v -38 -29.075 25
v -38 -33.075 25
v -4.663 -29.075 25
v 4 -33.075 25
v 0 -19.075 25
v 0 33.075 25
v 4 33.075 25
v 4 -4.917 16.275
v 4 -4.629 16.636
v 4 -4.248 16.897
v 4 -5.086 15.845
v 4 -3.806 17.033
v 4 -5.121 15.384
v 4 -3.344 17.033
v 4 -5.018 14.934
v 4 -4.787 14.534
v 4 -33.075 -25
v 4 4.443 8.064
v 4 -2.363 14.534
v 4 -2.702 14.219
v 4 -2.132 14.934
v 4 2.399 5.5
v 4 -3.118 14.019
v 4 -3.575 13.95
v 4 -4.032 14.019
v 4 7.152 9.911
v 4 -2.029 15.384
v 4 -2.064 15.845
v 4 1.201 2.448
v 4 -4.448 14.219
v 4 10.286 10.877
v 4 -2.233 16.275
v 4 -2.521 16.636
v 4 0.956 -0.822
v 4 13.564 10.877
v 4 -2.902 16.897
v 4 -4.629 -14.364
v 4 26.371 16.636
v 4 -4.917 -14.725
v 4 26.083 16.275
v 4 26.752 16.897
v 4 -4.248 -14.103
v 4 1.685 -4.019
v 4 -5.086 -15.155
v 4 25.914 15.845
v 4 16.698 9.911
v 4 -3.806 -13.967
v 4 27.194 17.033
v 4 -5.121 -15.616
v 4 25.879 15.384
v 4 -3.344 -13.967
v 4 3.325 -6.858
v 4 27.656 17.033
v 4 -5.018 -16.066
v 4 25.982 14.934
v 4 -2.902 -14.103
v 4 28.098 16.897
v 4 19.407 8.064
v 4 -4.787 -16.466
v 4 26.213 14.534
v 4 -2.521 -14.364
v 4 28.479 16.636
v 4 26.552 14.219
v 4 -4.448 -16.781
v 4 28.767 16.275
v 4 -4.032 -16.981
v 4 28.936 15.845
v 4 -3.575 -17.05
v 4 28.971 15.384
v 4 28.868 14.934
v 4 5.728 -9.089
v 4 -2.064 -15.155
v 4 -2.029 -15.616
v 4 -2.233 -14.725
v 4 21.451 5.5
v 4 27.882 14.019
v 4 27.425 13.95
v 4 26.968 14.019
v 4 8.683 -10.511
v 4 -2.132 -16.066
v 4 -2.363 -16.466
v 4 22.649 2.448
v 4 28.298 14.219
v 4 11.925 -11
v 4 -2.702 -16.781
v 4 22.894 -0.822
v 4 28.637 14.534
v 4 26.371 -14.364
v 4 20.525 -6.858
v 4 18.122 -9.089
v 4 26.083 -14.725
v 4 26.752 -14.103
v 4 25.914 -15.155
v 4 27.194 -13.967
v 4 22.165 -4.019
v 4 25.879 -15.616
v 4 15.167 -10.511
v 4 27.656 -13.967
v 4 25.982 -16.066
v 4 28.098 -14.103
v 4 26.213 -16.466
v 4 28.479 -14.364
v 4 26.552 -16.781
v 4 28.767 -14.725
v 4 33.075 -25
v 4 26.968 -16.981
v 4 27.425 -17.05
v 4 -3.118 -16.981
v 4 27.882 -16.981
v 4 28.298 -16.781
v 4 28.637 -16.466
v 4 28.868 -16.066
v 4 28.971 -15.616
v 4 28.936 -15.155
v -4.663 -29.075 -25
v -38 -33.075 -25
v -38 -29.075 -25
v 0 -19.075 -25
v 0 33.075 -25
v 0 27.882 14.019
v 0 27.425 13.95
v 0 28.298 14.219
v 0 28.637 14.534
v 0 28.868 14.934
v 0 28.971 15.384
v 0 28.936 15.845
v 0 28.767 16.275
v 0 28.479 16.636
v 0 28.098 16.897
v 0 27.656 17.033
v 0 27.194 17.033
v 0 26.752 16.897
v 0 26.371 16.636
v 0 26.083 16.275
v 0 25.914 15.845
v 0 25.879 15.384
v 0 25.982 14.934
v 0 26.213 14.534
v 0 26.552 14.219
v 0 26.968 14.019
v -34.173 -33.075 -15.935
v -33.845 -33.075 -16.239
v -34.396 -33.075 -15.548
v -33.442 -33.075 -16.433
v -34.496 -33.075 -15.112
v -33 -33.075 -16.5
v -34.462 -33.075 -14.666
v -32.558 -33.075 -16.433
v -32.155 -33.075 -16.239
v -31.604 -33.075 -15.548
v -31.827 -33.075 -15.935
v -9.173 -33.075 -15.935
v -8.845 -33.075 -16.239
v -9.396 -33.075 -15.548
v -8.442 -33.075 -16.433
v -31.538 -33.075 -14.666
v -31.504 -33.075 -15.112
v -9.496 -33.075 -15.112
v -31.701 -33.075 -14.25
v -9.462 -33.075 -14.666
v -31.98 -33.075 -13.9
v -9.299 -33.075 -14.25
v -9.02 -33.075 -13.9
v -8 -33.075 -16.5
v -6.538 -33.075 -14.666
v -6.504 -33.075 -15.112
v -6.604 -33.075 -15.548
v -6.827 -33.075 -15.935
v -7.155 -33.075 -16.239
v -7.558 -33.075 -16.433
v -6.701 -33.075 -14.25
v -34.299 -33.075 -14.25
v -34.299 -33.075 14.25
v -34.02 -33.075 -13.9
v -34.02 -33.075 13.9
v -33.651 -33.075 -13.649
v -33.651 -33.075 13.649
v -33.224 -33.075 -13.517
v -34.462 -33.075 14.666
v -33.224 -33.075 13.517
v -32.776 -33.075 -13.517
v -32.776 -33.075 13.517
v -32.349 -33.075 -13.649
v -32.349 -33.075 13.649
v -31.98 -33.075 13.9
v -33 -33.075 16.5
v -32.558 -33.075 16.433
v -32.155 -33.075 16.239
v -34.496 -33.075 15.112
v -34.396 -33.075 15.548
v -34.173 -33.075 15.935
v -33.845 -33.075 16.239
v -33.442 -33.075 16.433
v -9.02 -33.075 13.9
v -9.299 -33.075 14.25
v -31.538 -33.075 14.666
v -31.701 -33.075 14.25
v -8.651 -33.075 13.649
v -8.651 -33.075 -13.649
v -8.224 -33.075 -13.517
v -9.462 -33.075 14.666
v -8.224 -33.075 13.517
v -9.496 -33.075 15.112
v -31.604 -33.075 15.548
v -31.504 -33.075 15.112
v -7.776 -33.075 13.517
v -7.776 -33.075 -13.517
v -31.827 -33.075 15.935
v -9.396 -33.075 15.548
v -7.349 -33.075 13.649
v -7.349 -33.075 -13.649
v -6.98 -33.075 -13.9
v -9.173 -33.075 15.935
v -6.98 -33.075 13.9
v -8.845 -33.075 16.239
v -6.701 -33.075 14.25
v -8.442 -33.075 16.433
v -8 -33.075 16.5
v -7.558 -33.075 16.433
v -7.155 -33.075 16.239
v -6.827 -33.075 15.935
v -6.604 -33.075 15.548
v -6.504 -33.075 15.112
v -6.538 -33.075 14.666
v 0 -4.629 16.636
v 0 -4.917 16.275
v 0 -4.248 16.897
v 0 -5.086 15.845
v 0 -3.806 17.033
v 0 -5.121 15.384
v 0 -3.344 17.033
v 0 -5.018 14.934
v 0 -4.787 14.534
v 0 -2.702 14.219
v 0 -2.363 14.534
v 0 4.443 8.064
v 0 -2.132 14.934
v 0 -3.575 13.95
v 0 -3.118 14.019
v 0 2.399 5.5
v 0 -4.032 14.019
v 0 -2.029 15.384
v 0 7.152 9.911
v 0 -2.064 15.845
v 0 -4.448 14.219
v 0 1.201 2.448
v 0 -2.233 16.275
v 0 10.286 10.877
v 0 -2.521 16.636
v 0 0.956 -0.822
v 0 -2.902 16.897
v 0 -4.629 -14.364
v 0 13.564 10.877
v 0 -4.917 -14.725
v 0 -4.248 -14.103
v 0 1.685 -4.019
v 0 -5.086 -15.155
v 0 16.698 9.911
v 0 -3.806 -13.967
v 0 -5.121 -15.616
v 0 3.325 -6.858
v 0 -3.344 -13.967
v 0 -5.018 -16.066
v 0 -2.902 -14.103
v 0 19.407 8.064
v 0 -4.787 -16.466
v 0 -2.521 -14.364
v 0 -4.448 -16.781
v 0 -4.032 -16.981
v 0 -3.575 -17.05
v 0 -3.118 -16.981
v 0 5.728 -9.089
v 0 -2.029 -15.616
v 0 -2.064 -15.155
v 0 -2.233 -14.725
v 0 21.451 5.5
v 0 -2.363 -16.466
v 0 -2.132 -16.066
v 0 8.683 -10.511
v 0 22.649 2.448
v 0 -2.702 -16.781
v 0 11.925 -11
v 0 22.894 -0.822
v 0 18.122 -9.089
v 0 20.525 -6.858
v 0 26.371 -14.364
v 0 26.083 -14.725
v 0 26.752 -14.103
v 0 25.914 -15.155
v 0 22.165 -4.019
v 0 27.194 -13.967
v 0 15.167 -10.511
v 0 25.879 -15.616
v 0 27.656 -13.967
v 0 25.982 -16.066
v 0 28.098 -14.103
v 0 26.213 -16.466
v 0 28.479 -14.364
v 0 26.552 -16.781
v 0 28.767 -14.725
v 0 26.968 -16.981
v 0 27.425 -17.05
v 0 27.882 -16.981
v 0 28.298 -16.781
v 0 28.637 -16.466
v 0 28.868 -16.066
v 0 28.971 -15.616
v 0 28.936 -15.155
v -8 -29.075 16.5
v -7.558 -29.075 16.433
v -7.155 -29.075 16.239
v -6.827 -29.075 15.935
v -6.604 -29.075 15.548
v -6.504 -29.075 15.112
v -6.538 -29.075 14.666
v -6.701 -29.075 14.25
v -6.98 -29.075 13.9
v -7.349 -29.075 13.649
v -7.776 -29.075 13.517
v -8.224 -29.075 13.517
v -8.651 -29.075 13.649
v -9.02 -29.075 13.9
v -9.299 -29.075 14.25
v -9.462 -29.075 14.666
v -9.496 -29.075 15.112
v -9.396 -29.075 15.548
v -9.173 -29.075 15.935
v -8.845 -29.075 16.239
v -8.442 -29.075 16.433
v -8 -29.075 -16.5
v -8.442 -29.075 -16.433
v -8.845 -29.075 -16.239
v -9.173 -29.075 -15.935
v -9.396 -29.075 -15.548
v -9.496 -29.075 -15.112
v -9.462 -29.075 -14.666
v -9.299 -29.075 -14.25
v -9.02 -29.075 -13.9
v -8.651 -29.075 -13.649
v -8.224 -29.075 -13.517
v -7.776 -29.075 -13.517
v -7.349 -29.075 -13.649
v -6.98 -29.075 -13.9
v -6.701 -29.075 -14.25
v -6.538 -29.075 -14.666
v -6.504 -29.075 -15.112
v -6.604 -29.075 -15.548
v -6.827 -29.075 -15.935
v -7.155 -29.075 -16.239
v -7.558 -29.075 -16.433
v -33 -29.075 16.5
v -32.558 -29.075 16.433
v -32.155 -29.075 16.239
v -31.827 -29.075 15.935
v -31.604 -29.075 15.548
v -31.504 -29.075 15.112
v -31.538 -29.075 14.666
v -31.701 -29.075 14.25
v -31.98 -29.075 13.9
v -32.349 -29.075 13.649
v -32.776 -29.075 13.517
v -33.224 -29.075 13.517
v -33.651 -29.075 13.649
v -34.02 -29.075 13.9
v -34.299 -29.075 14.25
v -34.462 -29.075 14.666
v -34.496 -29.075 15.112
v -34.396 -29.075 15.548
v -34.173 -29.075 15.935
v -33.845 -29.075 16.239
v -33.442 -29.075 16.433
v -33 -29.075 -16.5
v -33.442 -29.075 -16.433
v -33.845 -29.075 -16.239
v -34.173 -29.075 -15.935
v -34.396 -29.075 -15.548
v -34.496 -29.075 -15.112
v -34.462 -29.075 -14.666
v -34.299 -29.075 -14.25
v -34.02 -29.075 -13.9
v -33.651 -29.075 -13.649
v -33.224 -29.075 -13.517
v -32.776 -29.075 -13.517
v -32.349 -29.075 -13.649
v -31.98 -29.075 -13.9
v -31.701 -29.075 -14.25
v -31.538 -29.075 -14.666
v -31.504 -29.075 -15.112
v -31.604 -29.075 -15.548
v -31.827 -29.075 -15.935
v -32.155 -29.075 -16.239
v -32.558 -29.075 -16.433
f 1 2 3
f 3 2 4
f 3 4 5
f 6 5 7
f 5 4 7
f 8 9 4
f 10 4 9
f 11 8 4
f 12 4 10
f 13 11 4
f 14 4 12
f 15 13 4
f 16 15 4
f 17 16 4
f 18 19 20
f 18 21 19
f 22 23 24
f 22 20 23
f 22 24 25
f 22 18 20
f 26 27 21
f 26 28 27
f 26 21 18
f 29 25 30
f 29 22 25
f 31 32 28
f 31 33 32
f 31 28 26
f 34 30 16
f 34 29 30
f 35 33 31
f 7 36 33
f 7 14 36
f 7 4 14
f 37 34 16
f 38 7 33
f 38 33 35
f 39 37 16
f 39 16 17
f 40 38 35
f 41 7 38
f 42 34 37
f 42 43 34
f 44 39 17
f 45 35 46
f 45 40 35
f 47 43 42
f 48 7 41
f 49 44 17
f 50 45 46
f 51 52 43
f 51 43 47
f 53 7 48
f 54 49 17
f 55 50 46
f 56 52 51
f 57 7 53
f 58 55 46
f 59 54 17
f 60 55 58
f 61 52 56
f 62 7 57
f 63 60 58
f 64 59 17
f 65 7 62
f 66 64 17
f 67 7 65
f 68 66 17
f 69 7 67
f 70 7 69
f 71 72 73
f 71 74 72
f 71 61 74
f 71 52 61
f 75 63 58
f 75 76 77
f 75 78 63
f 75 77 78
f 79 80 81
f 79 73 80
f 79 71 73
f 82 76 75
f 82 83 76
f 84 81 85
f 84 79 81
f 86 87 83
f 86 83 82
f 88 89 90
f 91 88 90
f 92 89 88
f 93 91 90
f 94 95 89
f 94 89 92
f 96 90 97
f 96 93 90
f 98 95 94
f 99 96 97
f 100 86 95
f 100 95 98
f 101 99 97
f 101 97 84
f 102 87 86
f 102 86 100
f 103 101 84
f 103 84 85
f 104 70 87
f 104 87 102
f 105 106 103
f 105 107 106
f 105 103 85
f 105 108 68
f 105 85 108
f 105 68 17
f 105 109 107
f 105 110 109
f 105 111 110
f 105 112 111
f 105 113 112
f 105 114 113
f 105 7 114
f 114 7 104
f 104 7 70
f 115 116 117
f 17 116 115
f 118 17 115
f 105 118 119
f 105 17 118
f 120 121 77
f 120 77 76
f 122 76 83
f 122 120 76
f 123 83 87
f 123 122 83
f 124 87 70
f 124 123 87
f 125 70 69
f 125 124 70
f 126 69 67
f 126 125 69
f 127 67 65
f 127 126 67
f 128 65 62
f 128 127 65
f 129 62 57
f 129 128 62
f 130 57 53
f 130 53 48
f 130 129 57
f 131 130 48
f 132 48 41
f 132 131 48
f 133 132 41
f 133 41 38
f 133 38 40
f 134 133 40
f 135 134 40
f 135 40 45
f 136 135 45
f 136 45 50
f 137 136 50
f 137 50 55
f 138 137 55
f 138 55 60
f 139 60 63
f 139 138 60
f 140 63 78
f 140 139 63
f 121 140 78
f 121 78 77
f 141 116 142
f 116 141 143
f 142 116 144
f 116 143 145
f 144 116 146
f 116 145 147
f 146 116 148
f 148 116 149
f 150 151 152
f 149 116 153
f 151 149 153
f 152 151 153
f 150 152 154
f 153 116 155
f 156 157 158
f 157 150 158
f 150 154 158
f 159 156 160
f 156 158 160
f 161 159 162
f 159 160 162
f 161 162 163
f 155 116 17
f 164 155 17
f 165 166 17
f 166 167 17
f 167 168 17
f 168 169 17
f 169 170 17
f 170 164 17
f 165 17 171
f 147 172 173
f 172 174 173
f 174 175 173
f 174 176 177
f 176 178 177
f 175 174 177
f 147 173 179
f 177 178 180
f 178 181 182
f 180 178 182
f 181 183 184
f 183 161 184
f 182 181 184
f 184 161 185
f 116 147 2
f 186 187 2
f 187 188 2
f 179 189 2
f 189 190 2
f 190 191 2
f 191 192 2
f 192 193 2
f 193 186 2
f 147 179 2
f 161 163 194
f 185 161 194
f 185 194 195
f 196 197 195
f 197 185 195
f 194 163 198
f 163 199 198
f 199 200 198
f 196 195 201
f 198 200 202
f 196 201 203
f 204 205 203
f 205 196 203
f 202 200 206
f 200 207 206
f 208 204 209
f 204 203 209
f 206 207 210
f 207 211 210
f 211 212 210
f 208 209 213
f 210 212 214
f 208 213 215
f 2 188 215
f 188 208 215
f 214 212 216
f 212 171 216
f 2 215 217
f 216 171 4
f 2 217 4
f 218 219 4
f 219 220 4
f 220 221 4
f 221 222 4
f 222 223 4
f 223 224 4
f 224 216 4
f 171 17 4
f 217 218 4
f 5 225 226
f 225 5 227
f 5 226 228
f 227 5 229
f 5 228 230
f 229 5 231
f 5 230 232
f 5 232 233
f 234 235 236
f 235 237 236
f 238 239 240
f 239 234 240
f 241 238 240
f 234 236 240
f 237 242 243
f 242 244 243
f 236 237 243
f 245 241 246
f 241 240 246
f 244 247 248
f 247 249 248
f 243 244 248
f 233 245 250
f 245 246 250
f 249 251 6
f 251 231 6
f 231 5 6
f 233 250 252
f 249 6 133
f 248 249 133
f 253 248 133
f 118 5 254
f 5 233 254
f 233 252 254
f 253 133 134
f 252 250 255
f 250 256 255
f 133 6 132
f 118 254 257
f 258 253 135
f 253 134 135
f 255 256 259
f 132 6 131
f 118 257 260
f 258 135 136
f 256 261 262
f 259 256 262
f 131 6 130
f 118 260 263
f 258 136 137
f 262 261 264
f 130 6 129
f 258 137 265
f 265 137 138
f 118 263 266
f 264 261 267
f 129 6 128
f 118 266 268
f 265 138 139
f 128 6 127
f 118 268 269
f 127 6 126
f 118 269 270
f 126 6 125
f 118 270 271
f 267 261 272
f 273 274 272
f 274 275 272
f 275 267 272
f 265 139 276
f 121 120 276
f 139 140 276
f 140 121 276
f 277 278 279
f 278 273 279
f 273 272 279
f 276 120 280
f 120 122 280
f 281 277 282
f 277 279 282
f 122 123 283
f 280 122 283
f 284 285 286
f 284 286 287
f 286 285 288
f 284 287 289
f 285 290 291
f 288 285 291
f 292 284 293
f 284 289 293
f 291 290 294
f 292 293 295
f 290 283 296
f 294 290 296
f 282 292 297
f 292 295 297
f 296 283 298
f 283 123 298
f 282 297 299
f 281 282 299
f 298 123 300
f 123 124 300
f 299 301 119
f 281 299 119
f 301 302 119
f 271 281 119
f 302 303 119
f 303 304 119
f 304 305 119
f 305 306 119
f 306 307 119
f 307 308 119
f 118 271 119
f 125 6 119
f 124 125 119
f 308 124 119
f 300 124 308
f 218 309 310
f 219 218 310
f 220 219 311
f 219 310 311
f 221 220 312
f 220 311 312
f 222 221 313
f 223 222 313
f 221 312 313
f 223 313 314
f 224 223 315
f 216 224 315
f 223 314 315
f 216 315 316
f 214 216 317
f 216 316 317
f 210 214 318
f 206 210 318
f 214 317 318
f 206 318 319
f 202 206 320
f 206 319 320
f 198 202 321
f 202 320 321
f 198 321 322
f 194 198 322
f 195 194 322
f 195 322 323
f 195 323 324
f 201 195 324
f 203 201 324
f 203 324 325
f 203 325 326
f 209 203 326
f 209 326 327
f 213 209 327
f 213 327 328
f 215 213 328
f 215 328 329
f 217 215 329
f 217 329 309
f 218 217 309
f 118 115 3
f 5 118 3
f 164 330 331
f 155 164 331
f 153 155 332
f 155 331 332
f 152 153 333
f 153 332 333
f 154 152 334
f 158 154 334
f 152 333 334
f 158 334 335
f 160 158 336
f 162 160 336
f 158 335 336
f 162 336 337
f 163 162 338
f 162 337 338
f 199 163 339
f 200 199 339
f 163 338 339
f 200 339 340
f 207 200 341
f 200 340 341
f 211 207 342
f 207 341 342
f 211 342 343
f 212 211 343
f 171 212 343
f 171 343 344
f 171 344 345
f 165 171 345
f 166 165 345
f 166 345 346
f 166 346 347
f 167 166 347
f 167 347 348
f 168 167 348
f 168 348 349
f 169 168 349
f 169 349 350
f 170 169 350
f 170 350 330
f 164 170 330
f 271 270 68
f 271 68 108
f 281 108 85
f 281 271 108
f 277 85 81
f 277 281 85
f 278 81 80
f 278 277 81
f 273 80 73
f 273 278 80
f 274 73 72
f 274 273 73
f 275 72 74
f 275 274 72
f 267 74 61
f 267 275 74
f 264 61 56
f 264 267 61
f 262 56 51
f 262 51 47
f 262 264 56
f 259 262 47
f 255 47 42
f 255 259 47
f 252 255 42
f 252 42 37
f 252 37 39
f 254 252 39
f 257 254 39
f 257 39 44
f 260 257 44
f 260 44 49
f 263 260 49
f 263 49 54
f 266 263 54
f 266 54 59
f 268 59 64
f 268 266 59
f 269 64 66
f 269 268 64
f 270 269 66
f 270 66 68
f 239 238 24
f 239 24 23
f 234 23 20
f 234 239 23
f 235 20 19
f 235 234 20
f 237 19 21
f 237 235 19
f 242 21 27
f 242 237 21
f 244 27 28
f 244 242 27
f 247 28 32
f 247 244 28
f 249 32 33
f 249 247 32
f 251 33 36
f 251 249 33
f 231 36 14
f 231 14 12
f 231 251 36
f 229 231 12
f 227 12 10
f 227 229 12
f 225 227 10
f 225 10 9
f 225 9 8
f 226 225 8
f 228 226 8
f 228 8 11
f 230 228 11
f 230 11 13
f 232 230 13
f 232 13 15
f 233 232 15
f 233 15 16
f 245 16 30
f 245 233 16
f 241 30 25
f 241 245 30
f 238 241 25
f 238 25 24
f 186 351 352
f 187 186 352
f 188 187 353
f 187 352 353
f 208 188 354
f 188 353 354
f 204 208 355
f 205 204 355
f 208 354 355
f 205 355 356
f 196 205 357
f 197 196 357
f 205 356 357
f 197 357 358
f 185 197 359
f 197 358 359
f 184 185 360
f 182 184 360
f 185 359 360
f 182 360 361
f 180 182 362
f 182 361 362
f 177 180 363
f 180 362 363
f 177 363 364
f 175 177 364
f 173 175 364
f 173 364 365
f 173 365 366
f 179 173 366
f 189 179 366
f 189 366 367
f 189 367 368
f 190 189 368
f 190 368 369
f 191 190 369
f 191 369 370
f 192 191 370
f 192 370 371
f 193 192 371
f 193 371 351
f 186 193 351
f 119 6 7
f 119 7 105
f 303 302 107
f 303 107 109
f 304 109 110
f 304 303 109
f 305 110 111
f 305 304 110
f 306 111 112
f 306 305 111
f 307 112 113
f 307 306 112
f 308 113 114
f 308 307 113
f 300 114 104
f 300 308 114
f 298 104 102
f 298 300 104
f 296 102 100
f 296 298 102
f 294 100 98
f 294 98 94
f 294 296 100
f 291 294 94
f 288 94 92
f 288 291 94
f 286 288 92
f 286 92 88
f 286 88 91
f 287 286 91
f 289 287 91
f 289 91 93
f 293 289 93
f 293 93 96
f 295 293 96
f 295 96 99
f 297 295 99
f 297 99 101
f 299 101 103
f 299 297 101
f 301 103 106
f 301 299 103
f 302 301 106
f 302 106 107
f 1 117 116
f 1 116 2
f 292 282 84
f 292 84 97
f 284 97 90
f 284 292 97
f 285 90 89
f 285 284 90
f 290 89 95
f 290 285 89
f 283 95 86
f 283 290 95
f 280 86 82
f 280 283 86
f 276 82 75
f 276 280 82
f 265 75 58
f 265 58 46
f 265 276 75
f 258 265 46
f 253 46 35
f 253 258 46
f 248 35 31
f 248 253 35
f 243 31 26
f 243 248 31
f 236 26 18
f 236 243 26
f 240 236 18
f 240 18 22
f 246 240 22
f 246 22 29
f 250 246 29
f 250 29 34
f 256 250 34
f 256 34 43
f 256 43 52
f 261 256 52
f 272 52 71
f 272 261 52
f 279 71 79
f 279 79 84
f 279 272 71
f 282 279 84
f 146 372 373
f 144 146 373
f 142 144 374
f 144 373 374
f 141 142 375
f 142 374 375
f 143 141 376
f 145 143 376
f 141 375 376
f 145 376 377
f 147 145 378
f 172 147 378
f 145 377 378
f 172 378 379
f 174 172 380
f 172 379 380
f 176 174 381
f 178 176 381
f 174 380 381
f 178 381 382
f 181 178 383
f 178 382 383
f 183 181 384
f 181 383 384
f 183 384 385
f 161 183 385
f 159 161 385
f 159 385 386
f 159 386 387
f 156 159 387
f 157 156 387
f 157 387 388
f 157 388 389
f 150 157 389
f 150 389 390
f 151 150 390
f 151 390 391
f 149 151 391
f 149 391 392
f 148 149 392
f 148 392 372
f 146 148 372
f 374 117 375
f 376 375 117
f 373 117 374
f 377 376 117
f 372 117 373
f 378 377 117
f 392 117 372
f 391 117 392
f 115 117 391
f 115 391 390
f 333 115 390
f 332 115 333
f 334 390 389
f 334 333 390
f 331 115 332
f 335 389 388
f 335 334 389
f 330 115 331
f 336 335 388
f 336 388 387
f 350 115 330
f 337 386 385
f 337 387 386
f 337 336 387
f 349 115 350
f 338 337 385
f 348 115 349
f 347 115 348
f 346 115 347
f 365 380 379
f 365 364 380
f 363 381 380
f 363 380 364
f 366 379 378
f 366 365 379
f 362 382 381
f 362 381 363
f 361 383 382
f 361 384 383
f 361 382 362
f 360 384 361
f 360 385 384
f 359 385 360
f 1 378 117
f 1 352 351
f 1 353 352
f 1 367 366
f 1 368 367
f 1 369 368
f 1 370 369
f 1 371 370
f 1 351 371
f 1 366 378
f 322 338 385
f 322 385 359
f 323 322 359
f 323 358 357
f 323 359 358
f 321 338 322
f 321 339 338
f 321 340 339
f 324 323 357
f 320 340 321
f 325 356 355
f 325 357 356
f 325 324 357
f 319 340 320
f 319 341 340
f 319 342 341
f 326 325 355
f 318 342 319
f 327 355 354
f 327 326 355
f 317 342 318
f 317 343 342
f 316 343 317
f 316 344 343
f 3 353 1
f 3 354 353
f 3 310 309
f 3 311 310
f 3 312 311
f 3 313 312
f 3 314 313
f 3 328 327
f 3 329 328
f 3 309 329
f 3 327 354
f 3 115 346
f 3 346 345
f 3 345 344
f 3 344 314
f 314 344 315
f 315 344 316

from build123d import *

# Parameters (mm, degrees)
SKETCH1_W           = 50
SKETCH1_H           = 66.15
SKETCH1_R           = 11
SKETCH1_R_2         = 1.55
BOSS_EXTRUDE1_DEPTH = 4
SKETCH2_W           = 50
SKETCH2_H           = 4
BOSS_EXTRUDE2_DEPTH = 38
SKETCH3_R           = 1.5
CUT_EXTRUDE1_DEPTH  = 78.017027338
CHAMFER1_SIZE       = 10
CHAMFER1_SIZE2      = 4.663076582


with BuildPart() as part:
    # Sketch1 → Boss-Extrude1 (new body)
    with BuildSketch(Plane(origin=(0, 0, 0), x_dir=(0, 0, -1), z_dir=(1, 0, 0))):
        Rectangle(SKETCH1_W, SKETCH1_H)
        with Locations((0, 11.925)):
            Circle(SKETCH1_R, mode=Mode.SUBTRACT)
        with Locations((-15.5, 27.425)):
            Circle(SKETCH1_R_2, mode=Mode.SUBTRACT)
        with Locations((15.5, 27.425)):
            Circle(SKETCH1_R_2, mode=Mode.SUBTRACT)
        with Locations((15.5, -3.575)):
            Circle(SKETCH1_R_2, mode=Mode.SUBTRACT)
        with Locations((-15.5, -3.575)):
            Circle(SKETCH1_R_2, mode=Mode.SUBTRACT)
    extrude(amount=BOSS_EXTRUDE1_DEPTH)

    # Sketch2 → Boss-Extrude2 (add)
    with BuildSketch(Plane.ZY):
        with Locations((0, -31.075)):
            Rectangle(SKETCH2_W, SKETCH2_H)
    extrude(amount=BOSS_EXTRUDE2_DEPTH)

    # Sketch3 → Cut-Extrude1 (cut, through all)
    with BuildSketch(Plane(origin=(0, -29.075, 0), x_dir=(1, 0, 0), z_dir=(0, 1, 0))):
        with Locations(Location((-33, -15, 0), (0, 0, 270))):
            Circle(SKETCH3_R)
        with Locations(Location((-8, -15, 0), (0, 0, 270))):
            Circle(SKETCH3_R)
        with Locations(Location((-8, 15, 0), (0, 0, 90))):
            Circle(SKETCH3_R)
        with Locations(Location((-33, 15, 0), (0, 0, 90))):
            Circle(SKETCH3_R)
    extrude(amount=-CUT_EXTRUDE1_DEPTH, mode=Mode.SUBTRACT)

    # Chamfer1
    chamfer1_edges = [part.edges().sort_by_distance(p)[0] for p in [
        (0, -29.075, 0),
    ]]
    chamfer1_side = [part.faces().sort_by_distance(p)[0] for p in [
        (0, 0.490102601, 0),
    ]]
    chamfer(chamfer1_edges, length=CHAMFER1_SIZE, length2=CHAMFER1_SIZE2, reference=chamfer1_side[0])


solid = part.part
